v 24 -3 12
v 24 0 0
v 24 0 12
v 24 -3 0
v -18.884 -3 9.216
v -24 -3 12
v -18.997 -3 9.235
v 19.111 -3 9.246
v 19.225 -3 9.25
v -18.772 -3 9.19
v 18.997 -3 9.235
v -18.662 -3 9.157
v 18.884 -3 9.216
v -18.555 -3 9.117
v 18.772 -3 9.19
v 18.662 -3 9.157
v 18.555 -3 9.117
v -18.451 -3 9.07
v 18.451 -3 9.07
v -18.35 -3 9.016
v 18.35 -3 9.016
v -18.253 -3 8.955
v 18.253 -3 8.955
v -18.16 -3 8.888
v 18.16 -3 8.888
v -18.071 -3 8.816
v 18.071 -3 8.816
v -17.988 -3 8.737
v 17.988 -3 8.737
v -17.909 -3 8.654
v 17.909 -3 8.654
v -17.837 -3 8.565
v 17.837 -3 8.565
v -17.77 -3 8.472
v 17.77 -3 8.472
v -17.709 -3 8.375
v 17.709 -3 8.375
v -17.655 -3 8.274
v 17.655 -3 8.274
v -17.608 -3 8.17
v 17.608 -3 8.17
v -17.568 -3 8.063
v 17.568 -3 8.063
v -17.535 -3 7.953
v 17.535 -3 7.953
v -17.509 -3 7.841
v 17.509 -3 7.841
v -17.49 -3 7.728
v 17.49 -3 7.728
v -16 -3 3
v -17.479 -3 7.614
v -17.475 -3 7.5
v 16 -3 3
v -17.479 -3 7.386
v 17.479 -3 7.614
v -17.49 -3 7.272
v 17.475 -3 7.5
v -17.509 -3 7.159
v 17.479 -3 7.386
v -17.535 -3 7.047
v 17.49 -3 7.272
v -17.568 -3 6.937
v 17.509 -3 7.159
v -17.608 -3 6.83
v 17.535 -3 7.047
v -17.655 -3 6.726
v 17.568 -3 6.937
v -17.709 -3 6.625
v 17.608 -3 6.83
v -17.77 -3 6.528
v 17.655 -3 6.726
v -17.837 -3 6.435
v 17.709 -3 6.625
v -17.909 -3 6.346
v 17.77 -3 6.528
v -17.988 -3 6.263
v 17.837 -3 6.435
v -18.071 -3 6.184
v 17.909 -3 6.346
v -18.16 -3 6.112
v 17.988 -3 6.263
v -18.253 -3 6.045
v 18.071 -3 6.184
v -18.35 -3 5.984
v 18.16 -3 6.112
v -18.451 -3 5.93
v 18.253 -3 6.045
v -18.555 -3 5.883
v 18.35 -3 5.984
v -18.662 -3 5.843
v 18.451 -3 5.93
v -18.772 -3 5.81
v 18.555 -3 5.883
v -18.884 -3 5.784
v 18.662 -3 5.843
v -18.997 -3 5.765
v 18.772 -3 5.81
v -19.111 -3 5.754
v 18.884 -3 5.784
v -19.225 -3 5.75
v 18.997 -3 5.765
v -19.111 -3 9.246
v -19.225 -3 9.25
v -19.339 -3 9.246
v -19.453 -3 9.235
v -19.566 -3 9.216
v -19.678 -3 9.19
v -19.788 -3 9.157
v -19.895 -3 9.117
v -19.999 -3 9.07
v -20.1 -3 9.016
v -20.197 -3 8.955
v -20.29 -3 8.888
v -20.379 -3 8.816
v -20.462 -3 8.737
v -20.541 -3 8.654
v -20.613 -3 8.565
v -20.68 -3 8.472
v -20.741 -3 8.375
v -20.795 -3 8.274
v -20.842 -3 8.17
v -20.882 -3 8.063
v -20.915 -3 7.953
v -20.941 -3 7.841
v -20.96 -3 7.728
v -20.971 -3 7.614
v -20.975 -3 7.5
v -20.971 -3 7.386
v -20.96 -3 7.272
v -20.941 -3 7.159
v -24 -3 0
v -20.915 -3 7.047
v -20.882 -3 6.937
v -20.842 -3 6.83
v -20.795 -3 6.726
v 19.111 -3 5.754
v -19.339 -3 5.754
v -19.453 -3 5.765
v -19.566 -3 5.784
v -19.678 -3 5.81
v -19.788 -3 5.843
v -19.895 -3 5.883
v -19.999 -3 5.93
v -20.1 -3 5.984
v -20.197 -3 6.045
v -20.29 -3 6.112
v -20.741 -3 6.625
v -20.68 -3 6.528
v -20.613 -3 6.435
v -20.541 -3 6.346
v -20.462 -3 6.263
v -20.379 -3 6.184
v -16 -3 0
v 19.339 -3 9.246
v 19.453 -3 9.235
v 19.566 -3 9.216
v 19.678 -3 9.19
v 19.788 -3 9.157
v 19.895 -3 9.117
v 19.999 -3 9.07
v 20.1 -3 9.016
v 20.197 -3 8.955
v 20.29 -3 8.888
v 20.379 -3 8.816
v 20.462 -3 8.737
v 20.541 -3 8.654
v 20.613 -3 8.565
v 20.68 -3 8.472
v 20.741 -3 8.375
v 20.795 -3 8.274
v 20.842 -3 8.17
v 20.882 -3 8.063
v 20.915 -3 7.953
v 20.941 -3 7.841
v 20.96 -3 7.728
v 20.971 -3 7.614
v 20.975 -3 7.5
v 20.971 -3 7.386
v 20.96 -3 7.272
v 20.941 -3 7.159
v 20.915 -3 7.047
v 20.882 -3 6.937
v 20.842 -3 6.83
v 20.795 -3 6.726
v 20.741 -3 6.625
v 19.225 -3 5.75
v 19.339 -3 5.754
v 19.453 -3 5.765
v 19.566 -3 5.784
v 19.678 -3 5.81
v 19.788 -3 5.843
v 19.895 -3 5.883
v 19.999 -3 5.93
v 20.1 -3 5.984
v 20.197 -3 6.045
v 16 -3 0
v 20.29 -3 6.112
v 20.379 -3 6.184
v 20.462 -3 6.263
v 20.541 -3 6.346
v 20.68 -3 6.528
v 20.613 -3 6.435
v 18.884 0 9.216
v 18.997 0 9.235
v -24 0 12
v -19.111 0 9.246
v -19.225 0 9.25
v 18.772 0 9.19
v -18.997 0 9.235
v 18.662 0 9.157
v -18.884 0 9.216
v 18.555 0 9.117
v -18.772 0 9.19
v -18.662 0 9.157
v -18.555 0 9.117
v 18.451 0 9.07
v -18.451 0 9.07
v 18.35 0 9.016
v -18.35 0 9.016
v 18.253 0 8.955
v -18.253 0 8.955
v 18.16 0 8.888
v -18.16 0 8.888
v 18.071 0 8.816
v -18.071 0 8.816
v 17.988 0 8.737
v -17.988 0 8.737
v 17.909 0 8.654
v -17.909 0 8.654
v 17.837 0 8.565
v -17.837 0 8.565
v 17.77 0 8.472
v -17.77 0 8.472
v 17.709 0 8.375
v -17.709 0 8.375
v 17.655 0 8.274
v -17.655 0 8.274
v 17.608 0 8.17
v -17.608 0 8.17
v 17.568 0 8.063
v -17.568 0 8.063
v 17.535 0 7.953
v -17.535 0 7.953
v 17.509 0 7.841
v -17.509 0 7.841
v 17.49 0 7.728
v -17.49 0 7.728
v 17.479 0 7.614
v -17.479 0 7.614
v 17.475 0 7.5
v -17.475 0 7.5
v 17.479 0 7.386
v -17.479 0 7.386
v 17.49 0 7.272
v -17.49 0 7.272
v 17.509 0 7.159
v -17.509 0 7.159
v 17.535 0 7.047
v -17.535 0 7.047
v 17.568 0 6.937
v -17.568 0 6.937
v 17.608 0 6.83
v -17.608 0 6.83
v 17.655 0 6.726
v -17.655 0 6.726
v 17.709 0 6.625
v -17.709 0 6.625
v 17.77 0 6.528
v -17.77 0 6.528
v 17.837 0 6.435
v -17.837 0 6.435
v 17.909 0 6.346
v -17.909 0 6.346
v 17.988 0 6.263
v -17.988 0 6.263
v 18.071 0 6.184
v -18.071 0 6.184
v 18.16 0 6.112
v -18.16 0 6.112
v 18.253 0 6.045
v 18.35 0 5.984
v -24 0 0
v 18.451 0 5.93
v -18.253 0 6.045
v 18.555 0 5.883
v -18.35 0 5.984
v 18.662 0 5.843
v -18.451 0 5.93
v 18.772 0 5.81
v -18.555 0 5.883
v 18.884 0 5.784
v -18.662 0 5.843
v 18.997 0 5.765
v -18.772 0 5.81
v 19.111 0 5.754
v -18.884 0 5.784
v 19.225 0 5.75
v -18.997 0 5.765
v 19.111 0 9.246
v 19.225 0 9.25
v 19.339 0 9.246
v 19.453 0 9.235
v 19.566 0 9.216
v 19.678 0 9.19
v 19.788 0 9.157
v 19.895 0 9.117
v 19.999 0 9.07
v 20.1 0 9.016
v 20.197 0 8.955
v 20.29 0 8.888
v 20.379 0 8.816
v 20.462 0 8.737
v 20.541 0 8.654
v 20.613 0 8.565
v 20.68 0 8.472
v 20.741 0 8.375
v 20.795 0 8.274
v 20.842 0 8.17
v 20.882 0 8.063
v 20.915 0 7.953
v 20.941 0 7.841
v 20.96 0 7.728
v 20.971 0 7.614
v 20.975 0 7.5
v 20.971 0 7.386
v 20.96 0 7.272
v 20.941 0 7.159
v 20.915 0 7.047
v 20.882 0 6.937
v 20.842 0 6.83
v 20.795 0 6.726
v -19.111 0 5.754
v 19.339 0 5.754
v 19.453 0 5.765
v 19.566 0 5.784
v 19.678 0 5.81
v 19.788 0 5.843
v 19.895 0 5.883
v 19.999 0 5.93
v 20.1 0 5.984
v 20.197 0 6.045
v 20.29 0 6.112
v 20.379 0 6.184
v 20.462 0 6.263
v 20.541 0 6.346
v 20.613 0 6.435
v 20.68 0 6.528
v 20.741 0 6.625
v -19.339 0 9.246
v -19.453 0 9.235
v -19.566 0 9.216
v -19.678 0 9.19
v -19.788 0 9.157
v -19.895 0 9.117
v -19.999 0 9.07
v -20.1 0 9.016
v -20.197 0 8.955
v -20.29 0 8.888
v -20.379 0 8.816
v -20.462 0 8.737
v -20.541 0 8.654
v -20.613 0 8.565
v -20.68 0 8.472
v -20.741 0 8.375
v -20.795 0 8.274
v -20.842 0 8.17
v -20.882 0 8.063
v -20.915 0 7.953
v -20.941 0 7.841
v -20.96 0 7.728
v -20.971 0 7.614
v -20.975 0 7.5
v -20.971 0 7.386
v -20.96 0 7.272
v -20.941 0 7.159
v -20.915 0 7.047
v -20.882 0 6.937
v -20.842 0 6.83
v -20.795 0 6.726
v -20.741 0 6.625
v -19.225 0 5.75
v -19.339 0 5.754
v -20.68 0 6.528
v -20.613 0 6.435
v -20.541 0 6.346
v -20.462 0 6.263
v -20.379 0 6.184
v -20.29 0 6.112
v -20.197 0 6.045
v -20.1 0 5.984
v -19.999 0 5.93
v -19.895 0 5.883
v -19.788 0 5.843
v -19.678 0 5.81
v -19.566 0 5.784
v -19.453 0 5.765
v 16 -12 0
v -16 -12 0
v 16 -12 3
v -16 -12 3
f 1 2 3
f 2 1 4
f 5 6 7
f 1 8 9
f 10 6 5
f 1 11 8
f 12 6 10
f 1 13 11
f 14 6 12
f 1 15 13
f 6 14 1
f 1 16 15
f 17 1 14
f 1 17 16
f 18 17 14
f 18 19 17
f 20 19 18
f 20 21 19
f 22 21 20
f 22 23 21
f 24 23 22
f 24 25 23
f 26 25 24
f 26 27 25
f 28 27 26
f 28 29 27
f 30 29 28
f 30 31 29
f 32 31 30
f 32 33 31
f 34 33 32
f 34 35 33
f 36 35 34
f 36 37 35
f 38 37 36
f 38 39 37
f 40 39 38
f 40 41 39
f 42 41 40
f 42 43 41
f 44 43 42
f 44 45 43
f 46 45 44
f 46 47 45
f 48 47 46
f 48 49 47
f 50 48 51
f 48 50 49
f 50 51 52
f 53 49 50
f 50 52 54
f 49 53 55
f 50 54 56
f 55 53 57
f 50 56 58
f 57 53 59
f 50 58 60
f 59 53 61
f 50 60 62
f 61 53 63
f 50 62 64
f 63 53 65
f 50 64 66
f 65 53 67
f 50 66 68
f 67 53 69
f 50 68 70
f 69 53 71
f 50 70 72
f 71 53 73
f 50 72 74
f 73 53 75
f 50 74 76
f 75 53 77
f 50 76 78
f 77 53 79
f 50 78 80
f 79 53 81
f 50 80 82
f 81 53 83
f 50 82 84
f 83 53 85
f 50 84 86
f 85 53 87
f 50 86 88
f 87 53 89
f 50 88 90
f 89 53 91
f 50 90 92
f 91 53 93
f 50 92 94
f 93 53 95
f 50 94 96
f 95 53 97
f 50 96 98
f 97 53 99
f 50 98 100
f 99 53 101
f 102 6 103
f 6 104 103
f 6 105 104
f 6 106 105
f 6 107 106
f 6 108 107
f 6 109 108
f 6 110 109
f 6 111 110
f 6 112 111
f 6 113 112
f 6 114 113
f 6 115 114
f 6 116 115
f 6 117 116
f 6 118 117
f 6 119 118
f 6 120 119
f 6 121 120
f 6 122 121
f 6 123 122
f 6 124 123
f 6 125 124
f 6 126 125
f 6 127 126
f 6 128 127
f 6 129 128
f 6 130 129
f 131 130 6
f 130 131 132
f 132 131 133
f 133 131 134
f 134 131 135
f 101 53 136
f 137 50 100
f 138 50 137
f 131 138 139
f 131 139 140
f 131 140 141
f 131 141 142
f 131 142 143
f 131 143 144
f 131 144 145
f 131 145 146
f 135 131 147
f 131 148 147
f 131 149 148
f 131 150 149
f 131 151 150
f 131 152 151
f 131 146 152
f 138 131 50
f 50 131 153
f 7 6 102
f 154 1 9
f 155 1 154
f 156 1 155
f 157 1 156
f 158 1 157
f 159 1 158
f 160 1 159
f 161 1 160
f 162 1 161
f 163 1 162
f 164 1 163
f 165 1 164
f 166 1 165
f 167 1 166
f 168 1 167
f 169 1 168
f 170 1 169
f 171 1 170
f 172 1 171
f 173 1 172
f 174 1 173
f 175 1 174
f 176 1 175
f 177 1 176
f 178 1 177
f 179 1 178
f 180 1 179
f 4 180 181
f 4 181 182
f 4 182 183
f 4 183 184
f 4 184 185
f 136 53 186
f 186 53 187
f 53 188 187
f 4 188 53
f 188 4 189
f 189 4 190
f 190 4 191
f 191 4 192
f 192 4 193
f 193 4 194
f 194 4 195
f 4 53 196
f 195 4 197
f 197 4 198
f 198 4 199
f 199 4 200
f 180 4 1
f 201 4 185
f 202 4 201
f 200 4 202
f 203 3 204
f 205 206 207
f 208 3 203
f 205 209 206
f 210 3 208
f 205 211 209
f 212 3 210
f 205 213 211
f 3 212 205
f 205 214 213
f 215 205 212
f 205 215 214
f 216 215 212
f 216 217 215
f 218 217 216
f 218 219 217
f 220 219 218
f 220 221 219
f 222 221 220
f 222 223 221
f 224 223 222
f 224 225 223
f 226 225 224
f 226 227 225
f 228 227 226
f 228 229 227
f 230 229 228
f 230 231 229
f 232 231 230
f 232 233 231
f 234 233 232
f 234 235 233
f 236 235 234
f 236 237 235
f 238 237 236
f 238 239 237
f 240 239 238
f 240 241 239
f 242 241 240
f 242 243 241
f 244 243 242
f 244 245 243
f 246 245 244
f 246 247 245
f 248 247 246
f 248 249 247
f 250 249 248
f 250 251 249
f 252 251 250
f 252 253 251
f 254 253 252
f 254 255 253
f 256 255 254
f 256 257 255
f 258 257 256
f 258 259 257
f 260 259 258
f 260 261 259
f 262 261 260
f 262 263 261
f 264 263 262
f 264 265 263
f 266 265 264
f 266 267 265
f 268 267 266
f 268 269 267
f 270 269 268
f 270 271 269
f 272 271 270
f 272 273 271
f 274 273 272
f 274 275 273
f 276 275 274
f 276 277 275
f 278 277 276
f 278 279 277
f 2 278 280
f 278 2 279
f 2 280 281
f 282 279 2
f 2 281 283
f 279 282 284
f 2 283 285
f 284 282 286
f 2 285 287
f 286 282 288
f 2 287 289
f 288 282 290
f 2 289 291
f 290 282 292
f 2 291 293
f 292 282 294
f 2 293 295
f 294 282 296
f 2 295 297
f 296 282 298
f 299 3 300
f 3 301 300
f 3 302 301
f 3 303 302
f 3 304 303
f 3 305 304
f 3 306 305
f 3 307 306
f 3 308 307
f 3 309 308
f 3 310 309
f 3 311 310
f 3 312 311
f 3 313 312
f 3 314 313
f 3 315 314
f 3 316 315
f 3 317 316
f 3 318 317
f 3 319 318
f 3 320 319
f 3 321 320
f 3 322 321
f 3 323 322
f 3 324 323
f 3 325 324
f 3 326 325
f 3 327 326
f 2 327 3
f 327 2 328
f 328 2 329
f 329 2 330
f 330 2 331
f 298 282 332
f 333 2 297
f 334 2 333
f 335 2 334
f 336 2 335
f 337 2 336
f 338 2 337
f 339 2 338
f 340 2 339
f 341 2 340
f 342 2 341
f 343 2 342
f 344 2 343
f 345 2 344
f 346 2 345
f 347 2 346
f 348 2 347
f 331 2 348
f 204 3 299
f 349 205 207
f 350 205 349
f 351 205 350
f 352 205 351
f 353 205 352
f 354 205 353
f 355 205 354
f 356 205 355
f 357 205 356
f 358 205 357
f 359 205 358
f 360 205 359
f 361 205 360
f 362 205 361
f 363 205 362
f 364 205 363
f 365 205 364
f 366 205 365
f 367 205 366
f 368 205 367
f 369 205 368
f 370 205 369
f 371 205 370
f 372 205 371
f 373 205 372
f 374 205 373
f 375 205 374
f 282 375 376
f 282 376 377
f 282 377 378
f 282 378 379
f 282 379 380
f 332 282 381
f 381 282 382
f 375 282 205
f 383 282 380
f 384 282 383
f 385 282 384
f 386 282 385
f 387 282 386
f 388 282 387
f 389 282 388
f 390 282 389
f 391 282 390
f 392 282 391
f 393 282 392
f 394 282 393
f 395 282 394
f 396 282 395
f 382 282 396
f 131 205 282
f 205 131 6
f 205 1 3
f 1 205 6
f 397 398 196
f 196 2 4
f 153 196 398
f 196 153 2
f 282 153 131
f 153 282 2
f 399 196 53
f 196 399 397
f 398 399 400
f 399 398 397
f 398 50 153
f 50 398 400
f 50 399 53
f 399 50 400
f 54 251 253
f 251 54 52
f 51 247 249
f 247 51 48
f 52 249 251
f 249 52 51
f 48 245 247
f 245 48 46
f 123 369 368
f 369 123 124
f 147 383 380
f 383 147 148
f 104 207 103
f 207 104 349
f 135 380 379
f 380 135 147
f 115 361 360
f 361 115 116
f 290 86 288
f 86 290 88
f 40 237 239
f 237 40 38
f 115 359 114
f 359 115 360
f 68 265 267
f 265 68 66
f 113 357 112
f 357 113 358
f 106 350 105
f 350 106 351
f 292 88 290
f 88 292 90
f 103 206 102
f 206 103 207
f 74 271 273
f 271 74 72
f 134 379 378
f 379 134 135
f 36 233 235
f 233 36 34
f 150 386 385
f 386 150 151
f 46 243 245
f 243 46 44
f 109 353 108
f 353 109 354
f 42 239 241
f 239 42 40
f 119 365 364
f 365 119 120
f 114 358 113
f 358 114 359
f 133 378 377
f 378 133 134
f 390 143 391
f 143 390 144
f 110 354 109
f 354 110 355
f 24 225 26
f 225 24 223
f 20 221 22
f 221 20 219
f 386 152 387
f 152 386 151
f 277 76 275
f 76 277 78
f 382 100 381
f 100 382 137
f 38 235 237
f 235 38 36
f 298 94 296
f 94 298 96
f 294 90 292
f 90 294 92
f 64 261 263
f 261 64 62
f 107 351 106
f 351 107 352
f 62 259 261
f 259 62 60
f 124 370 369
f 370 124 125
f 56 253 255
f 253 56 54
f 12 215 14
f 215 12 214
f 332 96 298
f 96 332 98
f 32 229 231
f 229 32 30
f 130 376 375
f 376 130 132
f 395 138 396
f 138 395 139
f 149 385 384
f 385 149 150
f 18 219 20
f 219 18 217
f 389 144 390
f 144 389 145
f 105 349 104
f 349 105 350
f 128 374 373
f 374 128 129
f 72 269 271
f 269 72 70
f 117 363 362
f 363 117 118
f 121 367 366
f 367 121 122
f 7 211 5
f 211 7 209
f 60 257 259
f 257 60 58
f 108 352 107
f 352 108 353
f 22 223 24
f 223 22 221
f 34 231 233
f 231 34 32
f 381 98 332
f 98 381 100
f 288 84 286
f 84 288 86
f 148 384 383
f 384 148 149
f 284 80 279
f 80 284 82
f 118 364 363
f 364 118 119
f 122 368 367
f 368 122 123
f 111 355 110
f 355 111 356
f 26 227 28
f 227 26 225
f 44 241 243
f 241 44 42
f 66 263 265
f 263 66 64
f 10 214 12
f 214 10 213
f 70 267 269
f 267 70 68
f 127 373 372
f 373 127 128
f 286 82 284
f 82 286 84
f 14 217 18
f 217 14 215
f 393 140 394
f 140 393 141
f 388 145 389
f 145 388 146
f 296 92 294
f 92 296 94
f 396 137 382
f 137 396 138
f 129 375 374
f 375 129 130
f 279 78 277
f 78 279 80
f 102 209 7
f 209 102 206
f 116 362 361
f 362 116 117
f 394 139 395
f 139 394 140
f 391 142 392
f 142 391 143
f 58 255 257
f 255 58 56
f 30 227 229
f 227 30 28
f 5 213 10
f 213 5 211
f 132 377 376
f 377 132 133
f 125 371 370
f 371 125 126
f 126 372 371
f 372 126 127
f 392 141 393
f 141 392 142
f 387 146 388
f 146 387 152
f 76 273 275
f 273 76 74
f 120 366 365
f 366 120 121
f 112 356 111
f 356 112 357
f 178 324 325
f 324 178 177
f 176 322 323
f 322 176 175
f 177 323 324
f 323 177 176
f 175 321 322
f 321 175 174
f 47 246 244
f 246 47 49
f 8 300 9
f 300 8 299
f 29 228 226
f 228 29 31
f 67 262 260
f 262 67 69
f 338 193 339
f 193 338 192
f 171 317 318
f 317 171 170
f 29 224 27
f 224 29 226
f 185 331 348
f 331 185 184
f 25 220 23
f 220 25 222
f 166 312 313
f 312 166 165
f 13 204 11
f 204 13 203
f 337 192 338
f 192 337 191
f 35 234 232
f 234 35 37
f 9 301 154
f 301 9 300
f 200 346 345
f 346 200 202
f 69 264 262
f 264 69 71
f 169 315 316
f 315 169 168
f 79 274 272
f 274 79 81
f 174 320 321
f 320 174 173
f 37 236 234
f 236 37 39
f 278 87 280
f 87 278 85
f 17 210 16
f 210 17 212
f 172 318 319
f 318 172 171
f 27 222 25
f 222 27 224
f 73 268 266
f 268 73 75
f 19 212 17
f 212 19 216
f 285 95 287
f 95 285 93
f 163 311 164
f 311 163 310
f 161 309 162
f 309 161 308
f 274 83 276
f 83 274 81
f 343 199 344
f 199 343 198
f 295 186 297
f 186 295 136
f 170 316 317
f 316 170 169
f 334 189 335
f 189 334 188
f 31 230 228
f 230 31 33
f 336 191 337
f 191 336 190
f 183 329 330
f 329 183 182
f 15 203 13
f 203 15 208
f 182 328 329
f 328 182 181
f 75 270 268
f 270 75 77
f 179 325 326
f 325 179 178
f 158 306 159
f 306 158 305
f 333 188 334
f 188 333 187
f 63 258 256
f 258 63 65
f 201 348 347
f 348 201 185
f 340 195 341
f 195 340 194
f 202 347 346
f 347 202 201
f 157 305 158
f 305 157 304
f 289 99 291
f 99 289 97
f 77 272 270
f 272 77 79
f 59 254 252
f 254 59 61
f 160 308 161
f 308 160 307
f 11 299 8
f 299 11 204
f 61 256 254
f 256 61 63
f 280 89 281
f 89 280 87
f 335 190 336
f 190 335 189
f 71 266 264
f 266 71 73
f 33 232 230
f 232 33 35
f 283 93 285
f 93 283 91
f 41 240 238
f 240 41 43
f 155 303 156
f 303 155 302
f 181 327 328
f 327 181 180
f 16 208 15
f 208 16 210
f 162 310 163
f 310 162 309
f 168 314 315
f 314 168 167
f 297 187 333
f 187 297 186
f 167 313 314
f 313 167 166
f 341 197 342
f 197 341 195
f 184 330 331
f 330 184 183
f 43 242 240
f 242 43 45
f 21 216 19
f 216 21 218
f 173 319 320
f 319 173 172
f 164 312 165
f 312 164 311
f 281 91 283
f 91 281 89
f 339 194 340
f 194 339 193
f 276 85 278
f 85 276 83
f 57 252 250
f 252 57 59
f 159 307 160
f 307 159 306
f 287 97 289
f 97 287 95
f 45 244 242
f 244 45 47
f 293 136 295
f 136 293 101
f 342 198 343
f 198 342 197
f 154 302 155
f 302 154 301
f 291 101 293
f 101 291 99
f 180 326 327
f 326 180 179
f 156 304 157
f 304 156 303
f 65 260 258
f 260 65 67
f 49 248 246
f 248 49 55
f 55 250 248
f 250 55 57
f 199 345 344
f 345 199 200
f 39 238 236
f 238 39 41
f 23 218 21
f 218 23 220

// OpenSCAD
// Optional axial stop. Not physically validated with the lamp end caps.
// All dimensions in mm. This stop is not a vertical load support.
base_width=48; base_length=12; base_thickness=3;
stop_width=32; stop_depth=3; stop_height=12;
hole_centers=38.45; hole_diameter=3.5;
print_orientation=true; $fn=96;
module stop(){
    difference(){
        union(){
            translate([-base_width/2,0,0])cube([base_width,base_length,base_thickness]);
            translate([-stop_width/2,0,0])cube([stop_width,stop_depth,stop_height]);
        }
        for(x=[-hole_centers/2,hole_centers/2])
            translate([x,7.5,-1])cylinder(d=hole_diameter,h=base_thickness+2);
    }
}
if(print_orientation)rotate([90,0,0])stop();else stop();
